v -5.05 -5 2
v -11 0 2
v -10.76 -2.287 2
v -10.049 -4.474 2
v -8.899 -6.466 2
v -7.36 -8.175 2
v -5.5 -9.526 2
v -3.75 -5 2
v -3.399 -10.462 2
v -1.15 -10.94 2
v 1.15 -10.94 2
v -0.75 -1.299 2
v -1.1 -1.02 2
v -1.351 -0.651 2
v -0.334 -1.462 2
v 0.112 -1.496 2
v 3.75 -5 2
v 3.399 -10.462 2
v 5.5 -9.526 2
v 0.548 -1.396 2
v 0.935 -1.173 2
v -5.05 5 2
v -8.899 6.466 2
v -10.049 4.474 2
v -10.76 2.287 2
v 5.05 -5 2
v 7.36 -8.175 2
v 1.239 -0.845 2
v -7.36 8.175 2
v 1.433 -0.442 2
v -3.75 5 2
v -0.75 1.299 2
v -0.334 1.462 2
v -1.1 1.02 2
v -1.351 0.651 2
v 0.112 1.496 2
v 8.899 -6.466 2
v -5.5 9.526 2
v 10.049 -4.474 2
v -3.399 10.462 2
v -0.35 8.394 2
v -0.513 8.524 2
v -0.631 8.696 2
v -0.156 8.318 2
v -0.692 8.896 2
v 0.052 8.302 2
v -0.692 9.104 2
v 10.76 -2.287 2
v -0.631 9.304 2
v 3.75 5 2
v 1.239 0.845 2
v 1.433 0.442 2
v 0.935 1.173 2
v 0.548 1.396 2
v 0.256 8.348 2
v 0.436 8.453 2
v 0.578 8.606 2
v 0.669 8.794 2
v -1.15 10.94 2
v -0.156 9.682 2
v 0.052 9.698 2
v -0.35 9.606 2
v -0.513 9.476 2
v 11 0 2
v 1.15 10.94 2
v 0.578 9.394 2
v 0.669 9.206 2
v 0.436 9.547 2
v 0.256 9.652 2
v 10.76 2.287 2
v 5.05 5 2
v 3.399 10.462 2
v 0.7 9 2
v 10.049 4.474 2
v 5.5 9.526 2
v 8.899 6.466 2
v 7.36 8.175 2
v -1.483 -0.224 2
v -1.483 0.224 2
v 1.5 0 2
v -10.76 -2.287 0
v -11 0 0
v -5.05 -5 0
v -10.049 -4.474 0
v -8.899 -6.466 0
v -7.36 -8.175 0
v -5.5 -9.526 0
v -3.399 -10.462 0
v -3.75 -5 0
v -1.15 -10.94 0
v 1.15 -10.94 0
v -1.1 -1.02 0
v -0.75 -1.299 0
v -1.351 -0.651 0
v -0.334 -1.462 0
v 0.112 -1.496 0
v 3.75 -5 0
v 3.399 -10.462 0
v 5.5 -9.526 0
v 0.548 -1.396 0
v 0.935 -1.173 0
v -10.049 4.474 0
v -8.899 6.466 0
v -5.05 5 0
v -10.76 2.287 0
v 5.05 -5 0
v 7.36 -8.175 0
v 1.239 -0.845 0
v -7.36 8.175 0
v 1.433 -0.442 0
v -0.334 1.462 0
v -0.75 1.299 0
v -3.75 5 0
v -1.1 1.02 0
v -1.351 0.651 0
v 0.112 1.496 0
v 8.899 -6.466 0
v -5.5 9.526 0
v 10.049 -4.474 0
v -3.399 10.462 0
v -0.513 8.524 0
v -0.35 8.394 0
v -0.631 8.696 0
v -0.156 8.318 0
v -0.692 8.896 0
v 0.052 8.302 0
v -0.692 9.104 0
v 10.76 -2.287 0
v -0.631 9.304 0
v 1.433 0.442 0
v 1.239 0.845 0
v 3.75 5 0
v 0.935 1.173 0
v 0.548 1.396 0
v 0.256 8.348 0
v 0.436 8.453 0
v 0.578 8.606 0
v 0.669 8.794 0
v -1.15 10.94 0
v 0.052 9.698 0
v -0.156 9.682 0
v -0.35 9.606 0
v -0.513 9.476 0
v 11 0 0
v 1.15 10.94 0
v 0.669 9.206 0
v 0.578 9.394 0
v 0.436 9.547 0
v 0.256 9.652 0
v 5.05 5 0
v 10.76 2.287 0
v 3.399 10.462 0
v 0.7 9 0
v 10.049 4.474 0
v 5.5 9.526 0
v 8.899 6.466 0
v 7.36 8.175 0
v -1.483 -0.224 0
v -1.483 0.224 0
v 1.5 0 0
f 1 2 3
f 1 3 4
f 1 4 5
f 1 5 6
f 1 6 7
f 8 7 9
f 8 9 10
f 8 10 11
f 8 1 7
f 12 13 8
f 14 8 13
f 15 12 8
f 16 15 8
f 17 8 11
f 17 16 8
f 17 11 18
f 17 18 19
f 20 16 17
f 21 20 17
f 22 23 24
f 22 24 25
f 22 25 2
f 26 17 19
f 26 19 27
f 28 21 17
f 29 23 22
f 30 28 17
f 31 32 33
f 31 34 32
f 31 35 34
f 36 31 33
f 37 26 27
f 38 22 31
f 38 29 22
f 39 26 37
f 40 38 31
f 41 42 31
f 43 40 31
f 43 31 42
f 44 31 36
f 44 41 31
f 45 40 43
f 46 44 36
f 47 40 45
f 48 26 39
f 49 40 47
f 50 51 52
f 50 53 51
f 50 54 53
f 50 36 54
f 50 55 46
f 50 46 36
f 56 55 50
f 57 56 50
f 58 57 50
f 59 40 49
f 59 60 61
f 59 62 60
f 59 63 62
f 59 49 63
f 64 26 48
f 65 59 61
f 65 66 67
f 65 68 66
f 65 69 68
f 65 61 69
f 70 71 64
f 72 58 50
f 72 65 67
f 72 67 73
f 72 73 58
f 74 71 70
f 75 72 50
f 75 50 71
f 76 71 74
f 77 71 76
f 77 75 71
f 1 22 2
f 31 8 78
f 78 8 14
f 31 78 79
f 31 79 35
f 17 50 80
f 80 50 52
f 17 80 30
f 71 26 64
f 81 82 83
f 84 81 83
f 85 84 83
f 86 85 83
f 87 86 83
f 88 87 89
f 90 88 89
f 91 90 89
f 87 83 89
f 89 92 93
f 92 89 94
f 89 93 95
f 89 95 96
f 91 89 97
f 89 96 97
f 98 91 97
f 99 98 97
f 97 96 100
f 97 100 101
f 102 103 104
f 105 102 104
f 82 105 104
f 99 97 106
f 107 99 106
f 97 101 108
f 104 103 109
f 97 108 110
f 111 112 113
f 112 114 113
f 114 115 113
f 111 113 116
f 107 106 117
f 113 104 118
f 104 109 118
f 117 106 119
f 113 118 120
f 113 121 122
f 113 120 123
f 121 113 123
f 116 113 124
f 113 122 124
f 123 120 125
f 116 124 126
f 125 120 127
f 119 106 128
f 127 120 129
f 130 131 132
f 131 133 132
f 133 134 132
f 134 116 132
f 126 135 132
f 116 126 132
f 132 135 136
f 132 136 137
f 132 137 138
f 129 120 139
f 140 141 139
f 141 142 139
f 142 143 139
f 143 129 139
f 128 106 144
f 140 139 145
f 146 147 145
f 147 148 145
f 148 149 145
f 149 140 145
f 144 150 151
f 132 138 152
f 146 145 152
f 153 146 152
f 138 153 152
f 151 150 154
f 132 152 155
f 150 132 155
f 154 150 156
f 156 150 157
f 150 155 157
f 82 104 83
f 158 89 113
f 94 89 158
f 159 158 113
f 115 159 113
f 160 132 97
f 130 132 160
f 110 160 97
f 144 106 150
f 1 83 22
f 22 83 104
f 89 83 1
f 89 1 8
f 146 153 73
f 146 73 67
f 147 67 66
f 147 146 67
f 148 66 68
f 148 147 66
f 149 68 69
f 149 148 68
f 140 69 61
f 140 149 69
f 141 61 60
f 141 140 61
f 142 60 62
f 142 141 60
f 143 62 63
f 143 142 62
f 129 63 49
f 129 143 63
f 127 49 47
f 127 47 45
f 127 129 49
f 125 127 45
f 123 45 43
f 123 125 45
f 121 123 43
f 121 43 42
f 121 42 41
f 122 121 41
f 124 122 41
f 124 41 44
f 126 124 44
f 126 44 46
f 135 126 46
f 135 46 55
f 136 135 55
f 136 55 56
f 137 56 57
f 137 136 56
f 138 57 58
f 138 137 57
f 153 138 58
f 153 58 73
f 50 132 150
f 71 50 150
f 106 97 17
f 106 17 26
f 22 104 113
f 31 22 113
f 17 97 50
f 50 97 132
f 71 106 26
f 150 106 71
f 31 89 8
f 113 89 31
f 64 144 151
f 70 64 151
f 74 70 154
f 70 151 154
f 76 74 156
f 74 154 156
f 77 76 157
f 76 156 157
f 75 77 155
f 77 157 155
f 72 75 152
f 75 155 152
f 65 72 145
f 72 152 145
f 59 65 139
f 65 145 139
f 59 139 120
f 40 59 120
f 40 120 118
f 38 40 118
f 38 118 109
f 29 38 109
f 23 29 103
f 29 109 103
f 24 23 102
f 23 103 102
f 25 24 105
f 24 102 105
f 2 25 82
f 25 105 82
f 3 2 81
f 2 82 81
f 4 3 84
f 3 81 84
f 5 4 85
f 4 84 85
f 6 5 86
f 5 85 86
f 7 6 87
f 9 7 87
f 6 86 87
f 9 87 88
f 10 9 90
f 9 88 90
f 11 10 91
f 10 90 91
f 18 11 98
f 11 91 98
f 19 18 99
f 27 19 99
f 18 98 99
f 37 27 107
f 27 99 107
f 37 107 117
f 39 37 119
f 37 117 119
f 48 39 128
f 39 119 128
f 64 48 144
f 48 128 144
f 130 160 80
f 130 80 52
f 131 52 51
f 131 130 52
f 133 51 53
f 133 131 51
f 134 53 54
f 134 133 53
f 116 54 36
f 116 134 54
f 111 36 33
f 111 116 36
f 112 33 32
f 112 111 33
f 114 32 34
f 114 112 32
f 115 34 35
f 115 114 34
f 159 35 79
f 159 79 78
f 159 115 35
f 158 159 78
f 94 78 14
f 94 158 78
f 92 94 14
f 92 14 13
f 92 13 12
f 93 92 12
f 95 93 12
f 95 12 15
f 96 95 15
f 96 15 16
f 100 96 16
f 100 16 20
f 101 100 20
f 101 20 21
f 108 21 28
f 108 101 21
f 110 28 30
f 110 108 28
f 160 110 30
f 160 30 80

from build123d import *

# Parameters (mm, degrees)
SKETCH1_R           = 11
SKETCH1_R_2         = 1.5
SKETCH1_R_3         = 0.7
SKETCH1_W           = 1.3
SKETCH1_H           = 10
BOSS_EXTRUDE1_DEPTH = 2


with BuildPart() as part:
    # Sketch1 → Boss-Extrude1 (new body)
    with BuildSketch(Plane.XY):
        Circle(SKETCH1_R)
        Circle(SKETCH1_R_2, mode=Mode.SUBTRACT)
        with Locations((0, 9)):
            Circle(SKETCH1_R_3, mode=Mode.SUBTRACT)
        with Locations((-4.4, 0)):
            Rectangle(SKETCH1_W, SKETCH1_H, mode=Mode.SUBTRACT)
        with Locations((4.4, 0)):
            Rectangle(SKETCH1_W, SKETCH1_H, mode=Mode.SUBTRACT)
    extrude(amount=BOSS_EXTRUDE1_DEPTH)


solid = part.part
